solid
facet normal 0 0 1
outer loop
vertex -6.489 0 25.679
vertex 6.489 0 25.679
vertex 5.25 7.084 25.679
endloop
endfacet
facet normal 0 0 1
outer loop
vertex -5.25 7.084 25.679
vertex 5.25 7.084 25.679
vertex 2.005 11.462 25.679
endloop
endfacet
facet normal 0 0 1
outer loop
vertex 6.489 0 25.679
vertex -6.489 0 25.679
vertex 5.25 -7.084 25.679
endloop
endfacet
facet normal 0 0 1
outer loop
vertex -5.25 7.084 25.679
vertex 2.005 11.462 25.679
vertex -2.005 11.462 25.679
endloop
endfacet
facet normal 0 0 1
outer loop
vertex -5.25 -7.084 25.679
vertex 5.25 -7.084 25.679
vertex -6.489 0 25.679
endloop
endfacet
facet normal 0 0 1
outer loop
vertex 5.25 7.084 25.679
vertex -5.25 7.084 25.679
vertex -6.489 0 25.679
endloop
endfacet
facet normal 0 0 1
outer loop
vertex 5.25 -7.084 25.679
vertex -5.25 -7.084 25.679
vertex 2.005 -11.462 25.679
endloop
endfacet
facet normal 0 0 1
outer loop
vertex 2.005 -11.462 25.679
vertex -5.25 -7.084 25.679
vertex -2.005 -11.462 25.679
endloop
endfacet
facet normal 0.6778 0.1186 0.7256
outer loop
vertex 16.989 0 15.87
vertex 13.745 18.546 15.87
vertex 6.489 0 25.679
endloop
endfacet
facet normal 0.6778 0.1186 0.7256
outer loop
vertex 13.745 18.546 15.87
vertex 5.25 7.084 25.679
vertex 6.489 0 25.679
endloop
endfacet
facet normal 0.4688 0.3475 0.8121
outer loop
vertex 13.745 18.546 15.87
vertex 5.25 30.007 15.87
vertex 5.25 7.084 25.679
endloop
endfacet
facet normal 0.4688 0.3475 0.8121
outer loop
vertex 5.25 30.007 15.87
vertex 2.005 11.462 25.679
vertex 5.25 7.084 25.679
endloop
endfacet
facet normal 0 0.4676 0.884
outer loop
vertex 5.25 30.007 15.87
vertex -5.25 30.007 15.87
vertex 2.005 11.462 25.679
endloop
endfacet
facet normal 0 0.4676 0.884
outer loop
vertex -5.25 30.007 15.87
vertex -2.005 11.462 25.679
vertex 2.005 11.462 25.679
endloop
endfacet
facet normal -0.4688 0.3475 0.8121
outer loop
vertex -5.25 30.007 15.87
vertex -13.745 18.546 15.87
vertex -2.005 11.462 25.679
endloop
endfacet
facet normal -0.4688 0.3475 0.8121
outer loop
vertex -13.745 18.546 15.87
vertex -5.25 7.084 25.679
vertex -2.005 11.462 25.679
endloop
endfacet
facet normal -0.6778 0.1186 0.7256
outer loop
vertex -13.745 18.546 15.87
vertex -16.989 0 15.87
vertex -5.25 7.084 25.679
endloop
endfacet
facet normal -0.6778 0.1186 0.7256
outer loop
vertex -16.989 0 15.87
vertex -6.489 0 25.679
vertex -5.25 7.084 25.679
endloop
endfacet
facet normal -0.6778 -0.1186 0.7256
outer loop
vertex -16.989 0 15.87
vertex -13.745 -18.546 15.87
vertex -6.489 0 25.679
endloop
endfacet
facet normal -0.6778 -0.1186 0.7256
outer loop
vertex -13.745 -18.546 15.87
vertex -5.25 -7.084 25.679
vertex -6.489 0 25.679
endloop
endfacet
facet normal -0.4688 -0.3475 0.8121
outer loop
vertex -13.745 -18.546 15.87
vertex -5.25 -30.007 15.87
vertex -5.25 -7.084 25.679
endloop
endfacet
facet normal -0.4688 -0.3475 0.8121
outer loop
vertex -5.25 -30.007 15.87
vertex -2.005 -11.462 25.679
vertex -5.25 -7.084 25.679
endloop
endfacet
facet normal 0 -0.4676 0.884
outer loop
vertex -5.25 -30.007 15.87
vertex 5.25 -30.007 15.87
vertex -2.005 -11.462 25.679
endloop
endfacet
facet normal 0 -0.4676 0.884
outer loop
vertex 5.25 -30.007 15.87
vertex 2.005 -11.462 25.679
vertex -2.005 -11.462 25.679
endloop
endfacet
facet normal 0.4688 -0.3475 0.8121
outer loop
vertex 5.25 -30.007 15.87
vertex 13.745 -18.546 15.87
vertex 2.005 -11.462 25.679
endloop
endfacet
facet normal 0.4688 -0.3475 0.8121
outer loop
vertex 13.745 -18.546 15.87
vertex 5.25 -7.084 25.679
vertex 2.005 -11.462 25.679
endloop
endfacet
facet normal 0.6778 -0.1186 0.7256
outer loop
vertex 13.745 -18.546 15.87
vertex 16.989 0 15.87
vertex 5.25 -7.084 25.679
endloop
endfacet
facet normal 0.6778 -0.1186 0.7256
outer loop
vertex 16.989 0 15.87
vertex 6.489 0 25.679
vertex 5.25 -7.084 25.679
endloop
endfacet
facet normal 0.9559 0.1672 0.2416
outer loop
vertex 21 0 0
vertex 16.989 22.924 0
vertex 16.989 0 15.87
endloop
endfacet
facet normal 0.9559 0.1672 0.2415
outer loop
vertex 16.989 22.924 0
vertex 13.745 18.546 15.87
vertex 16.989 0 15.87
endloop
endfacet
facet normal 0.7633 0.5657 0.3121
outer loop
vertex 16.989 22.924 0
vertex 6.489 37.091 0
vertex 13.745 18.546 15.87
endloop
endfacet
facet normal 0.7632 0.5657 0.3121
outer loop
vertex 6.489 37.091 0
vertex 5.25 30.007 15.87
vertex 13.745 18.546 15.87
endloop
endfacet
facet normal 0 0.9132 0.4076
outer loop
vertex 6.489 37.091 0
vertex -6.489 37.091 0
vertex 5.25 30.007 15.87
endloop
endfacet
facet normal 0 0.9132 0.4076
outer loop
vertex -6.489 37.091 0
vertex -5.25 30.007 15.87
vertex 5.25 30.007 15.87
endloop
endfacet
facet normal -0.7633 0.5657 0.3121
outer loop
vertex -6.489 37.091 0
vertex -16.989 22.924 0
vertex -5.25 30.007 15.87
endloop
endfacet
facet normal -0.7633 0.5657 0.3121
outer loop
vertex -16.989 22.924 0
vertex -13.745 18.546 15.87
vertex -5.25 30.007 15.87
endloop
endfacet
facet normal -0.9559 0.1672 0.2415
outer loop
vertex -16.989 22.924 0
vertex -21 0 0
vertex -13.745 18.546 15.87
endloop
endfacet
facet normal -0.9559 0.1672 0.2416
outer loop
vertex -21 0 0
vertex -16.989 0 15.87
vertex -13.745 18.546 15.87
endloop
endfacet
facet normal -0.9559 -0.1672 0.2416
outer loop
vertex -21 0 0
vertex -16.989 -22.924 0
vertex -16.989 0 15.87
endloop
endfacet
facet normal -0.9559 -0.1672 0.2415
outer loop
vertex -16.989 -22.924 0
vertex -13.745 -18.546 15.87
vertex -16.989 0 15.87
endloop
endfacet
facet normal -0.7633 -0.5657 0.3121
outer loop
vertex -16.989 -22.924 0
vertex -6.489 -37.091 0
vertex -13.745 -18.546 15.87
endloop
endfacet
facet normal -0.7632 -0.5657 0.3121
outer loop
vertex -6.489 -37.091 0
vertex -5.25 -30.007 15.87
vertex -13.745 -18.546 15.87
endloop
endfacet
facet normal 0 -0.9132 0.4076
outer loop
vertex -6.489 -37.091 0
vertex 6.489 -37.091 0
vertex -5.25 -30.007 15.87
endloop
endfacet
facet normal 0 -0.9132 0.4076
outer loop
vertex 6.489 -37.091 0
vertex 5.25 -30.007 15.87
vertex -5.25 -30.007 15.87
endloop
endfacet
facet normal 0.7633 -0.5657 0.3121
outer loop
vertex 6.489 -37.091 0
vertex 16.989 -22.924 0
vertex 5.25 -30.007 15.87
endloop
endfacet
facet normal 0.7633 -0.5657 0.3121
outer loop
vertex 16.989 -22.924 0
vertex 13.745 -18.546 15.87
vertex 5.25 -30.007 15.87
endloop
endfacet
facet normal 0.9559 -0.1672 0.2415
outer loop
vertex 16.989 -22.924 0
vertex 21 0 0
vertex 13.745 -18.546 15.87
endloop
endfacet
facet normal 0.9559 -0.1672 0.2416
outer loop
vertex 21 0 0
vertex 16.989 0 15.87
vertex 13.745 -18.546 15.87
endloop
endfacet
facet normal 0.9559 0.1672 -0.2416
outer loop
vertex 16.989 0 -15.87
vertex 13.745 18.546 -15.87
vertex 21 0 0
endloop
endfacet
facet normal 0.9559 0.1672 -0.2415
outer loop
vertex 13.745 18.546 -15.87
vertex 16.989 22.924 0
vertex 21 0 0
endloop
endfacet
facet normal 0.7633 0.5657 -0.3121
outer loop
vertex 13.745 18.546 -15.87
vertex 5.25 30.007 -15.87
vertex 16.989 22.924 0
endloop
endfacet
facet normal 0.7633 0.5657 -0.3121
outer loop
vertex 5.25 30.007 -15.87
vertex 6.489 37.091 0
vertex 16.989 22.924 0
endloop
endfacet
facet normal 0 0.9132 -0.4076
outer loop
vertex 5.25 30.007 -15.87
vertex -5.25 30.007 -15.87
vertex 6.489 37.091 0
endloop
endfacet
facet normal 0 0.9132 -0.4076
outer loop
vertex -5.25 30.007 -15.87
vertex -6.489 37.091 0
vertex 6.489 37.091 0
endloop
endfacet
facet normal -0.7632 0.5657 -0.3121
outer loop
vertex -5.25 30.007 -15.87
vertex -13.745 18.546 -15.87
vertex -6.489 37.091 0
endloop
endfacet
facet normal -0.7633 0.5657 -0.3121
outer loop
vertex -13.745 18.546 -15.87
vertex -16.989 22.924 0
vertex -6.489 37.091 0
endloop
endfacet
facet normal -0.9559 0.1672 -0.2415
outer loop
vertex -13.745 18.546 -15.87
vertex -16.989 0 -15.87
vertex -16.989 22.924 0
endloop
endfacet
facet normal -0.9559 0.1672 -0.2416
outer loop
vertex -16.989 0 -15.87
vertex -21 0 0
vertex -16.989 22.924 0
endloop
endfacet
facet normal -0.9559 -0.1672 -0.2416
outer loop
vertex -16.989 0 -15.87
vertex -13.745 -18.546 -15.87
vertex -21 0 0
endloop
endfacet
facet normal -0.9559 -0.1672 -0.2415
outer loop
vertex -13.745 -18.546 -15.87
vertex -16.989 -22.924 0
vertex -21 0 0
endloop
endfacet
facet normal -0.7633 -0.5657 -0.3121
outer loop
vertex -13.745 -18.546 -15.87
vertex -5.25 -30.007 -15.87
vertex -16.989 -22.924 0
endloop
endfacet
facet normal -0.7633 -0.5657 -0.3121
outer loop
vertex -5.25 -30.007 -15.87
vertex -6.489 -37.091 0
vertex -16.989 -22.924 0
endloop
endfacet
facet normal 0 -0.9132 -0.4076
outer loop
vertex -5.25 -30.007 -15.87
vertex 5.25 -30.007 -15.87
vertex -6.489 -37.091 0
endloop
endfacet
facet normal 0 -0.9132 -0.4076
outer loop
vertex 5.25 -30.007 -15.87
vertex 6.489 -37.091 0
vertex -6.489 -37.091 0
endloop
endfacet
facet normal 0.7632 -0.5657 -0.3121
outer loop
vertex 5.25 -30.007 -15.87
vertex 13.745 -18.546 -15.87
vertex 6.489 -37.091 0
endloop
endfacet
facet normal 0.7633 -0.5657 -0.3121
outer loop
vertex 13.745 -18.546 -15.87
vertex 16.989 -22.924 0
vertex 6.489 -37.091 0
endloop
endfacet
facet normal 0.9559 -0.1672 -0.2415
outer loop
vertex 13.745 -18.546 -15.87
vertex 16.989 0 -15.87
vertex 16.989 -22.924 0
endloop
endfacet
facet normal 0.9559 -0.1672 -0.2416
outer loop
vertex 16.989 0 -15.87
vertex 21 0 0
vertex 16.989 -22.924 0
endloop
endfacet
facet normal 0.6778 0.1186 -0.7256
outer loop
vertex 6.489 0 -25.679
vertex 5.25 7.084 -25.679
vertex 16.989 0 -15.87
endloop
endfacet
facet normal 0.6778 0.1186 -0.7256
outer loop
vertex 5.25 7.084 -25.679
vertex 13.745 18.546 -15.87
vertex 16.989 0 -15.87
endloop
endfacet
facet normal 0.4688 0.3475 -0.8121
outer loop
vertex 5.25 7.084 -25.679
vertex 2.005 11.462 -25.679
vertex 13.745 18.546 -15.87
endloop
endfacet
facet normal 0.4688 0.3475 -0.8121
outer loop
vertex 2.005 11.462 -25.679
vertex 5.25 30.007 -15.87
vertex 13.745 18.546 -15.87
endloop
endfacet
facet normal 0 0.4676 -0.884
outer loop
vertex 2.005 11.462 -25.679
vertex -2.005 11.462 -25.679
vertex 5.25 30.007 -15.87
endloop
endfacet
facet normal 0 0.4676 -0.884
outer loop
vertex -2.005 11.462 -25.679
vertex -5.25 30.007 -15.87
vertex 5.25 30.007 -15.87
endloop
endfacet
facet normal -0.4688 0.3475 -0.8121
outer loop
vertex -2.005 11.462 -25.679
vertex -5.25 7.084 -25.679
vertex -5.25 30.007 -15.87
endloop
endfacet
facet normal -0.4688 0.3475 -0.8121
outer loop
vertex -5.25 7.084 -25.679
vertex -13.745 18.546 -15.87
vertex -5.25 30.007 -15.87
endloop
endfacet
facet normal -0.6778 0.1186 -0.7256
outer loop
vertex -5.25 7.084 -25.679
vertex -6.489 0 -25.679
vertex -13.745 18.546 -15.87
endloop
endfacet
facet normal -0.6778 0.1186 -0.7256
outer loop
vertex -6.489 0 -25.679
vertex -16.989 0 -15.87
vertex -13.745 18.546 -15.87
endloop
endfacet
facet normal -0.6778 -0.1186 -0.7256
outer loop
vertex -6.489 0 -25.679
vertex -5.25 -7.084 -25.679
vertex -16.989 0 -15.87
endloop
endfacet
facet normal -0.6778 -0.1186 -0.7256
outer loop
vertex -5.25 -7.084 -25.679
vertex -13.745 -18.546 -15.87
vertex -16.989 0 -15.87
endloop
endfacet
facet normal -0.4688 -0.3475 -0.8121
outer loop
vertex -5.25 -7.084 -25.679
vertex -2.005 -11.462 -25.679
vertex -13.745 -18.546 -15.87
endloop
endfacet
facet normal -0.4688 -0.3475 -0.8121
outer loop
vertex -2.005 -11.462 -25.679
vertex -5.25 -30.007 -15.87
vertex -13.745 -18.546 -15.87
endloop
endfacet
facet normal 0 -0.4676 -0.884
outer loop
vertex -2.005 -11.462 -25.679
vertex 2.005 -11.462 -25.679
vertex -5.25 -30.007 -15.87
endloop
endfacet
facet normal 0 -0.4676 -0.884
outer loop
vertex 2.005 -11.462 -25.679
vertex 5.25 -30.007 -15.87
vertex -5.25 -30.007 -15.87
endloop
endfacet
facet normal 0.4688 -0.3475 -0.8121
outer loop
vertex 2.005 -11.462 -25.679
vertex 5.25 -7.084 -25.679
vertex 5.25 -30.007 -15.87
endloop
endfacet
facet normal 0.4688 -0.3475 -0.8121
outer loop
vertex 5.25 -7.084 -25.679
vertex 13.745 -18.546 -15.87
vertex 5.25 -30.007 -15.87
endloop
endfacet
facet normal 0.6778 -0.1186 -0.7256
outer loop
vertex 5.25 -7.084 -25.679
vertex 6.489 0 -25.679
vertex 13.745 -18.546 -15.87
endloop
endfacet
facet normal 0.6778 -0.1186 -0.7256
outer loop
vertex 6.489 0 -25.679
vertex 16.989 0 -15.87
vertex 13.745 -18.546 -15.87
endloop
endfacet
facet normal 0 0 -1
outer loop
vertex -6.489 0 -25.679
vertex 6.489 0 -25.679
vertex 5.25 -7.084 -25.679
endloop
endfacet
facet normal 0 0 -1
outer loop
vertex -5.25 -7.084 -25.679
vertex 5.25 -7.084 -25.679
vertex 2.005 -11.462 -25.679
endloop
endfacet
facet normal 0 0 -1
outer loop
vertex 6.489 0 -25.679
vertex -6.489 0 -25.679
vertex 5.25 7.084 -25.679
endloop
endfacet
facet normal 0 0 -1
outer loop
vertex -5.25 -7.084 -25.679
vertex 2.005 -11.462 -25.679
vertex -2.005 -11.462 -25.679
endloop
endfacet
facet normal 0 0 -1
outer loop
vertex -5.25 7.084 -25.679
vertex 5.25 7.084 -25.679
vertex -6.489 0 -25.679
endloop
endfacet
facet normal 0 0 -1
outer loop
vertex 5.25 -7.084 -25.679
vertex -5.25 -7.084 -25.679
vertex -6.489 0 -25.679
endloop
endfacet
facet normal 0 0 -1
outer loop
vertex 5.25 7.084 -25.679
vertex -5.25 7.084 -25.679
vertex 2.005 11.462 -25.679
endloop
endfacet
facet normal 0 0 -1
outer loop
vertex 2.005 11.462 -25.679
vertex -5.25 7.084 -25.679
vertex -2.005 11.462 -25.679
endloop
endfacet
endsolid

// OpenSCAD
// Generated by SolidPython 1.0.1 on 2020-07-29 00:46:47


scale(v = [7, 13, 9]) {
	sphere(r = 3);
}
/***********************************************
*********      SolidPython code:      **********
************************************************
 
# import packages: SolidPython
from solid import *
from solid.utils import *
from itertools import chain, combinations, permutations


class Resize:

    def __init__(self, scad_file):
        self.scad_file = scad_file
        #self.scad_file = import_scad(scad_file)
        # cone/cylinder param:
        self.r1 = 0
        self.r2 = 0
        self.h = 0
        # rectangular prism param:
        self.w = 0
        self.l = 0
        # ellipse param:
        self.r = 0

    # import OpenScad code (file name corresponds to shape)


    # classify shape + parameters
    def assign(self, param1, param2, param3):
        if self.scad_file == 'cone.scad':
            self.r1 = param1
            self.r2 = param2
            self.h = param3
        elif self.scad_file == 'cylinder.scad':
            self.r1 = param1
            self.r2 = param2
            self.h = param3
        elif self.scad_file == 'rectangularPrism.scad':
            self.h = param1
            self.l = param2
            self.w = param3
        else:
            self.r = param1
            self.h = param2

    # resize parameters
    def iterate(self):
        x = range(3, 20, 2)
        i = 1
        if self.scad_file == 'cone.scad':
            tempList = list(permutations(x, 2))
            for temp in tempList:
                param1 = temp[0]
                param2 = temp[1]
                filepath = 'produced_scad_files/' + 'cone' + str(param1) + '_' + str(param2) + '_' + '.scad'
                scad_render_to_file(cylinder(h=param1, r1=param2, r2=0), filepath)

        elif self.scad_file == 'cylinder.scad':
            tempList = list(permutations(x, 3))
            for temp in tempList:
                param1 = temp[0]
                param2 = temp[1]
                filepath = 'produced_scad_files/' + 'cylinder' + str(param1) + '_' + str(param2) + '_' + '.scad'
                scad_render_to_file(cylinder(h=param1, r1=param2, r2=param2), filepath)

        elif self.scad_file == 'rectangularPrism.scad':
            tempList = list(permutations(x, 3))
            for temp in tempList:
                param1 = temp[0]
                param2 = temp[1]
                param3 = temp[2]
                filepath = 'produced_scad_files/' + 'rectangularPrism' + str(param1) + '_' + str(param2) + '_' + str(
                    param3) + '.scad'
                scad_render_to_file(cube(size=(param1, param2, param3)), filepath)

        elif self.scad_file == 'ellipse.scad':
            tempList = list(permutations(x, 4))
            for temp in tempList:
                param1 = temp[0]
                param2 = temp[1]
                param3 = temp[2]
                param4 = temp[3]
                filepath = 'produced_scad_files/' + 'ellipse' + str(param1) + '_' + str(param2) + '_' + str(param3) + '_' + str(param4) + '.scad'
                scad_render_to_file(scale([param1, param2, param3])(sphere(r=param4)), filepath)

    def render_to_scadfile(self):
        scad_render_to_file(scad, 'example.scad') 
 
************************************************/
